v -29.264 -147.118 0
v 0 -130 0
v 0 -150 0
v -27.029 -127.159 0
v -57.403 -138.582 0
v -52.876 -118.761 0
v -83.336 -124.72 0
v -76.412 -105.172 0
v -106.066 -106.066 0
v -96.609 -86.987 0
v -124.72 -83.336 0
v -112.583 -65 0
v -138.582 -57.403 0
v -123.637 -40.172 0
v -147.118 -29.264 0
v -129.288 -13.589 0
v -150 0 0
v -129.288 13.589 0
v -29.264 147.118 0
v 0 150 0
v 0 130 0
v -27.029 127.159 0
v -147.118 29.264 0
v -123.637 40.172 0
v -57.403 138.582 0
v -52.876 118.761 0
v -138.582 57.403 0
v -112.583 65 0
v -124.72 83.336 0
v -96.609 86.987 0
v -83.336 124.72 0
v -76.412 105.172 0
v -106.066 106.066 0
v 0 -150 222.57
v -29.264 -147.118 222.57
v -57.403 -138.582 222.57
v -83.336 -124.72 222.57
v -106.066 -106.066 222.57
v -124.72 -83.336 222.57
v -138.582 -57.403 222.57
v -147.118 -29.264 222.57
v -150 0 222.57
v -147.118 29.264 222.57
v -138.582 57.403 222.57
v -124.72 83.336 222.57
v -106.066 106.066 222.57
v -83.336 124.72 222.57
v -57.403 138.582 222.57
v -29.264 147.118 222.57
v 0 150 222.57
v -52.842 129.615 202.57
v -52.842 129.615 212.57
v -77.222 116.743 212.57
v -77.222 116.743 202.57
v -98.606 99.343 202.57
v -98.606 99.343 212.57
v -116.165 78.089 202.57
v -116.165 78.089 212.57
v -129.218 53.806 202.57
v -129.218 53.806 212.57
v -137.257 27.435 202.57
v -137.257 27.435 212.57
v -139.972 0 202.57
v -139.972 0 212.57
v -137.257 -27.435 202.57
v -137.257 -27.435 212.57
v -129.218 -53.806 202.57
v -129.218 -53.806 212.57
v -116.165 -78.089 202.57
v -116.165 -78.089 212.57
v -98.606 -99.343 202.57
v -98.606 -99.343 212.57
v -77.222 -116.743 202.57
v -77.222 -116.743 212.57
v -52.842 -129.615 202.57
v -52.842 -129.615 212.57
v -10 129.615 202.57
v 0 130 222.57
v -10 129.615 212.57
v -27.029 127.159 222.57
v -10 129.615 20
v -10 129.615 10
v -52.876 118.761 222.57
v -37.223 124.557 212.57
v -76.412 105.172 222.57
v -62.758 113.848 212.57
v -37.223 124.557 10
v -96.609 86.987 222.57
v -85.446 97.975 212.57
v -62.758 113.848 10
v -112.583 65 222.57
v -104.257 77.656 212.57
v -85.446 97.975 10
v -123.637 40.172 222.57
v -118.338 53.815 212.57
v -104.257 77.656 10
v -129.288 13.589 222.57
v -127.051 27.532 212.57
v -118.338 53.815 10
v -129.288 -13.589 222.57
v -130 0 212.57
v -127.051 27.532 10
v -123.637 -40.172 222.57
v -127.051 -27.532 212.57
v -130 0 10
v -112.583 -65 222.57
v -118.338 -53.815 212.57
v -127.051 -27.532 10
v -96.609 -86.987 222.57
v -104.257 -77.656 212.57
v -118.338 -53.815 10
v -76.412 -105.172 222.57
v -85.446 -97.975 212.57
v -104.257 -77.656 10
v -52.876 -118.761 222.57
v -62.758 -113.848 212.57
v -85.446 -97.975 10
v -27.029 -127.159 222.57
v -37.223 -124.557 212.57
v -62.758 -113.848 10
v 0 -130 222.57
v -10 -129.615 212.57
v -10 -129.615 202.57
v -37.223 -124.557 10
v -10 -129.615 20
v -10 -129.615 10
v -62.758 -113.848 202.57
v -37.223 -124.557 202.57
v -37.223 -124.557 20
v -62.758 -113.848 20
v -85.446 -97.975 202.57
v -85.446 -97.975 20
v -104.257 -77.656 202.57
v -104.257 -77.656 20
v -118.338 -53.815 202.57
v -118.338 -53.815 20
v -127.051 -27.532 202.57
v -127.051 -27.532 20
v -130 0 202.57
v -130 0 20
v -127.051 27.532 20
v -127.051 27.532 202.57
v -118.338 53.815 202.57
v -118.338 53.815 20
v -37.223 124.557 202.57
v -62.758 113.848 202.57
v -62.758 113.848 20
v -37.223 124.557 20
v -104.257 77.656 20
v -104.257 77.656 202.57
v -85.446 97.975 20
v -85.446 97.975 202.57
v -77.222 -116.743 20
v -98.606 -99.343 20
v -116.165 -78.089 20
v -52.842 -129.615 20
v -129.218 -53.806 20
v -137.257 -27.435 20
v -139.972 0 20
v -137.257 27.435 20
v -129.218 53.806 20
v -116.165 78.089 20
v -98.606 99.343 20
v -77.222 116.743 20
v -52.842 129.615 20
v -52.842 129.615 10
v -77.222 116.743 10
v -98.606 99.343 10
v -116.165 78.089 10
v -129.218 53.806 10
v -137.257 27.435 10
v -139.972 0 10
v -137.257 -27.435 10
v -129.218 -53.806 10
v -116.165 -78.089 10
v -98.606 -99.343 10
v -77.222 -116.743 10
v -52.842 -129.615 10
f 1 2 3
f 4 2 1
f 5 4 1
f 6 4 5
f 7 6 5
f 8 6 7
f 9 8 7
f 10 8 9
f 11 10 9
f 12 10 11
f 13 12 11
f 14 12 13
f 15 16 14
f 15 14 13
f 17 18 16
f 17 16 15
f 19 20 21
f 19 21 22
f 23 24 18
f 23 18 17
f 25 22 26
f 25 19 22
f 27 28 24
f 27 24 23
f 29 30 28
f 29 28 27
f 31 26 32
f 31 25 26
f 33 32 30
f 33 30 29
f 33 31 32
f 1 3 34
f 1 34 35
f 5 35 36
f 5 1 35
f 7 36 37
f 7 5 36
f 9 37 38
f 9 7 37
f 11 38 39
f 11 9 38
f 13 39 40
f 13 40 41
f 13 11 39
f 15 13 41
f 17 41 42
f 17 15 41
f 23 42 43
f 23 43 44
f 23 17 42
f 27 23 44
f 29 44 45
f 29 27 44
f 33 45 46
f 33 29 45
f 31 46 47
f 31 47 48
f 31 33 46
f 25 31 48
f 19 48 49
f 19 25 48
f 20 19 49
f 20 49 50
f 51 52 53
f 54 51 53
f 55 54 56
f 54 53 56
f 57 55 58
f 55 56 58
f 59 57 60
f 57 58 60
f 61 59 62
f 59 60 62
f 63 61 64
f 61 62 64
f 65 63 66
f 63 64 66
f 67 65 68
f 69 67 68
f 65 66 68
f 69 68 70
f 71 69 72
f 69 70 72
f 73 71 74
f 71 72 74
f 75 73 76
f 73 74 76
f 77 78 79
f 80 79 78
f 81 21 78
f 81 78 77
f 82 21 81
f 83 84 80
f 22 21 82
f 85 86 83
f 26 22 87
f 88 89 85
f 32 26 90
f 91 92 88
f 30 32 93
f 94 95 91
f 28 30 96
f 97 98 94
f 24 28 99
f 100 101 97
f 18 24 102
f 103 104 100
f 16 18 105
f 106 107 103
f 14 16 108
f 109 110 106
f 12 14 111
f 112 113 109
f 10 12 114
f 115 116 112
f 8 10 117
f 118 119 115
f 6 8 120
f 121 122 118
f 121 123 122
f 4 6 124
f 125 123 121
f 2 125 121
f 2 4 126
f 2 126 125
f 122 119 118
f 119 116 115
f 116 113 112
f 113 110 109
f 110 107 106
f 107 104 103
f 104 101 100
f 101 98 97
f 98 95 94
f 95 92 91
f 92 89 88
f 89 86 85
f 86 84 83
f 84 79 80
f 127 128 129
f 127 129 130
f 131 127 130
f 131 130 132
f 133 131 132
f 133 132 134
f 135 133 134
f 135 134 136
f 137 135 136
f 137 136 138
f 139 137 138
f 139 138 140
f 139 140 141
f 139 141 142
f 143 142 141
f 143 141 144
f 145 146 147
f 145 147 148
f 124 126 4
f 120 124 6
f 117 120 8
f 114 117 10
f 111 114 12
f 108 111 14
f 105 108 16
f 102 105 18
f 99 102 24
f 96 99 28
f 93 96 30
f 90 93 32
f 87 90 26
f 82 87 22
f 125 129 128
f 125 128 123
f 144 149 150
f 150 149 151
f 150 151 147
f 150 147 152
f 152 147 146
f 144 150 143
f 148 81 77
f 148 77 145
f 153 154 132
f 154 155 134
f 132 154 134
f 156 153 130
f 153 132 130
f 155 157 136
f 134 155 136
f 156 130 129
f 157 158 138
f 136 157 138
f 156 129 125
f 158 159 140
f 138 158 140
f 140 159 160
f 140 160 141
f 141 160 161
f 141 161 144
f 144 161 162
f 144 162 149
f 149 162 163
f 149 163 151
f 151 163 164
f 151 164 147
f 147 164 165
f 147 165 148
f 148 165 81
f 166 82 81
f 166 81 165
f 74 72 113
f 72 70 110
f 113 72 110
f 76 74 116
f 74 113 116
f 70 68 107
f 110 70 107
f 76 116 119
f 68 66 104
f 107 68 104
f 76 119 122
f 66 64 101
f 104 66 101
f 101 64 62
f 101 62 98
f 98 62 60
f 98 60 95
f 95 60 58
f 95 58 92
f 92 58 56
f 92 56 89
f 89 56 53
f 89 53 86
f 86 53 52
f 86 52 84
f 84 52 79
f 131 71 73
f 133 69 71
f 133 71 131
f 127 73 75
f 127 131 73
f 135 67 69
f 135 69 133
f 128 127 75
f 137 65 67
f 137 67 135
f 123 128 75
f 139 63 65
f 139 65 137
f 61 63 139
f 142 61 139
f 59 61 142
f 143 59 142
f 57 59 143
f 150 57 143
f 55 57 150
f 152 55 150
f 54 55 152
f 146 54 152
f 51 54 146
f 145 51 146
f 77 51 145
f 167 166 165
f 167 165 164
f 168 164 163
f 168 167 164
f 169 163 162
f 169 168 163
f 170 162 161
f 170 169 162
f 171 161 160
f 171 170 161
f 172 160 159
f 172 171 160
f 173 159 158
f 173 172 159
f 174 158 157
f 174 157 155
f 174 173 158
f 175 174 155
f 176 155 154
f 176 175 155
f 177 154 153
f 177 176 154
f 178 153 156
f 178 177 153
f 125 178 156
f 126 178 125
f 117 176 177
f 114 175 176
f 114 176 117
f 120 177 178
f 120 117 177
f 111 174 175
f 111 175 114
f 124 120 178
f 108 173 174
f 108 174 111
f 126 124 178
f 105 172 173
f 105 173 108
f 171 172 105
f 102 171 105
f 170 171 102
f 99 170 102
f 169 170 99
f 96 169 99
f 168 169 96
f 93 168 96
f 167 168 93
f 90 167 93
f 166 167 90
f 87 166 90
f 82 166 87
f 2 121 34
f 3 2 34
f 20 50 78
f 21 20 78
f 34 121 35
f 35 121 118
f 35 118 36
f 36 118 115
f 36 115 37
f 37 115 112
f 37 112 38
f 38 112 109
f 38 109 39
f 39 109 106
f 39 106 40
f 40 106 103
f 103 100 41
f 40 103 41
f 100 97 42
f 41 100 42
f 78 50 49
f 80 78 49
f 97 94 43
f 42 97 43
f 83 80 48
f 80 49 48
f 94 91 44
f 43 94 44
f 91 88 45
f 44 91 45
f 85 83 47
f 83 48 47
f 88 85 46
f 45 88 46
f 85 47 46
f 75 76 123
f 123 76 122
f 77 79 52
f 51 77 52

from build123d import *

# Parameters (mm, degrees)
BOSS_EXTRUDE1_DEPTH = 222.57
CUT_EXTRUDE2_START  = -10
CUT_EXTRUDE2_DEPTH  = 10
CUT_EXTRUDE3_START  = -10
CUT_EXTRUDE3_DEPTH  = 10


with BuildPart() as part:
    # Sketch1 → Boss-Extrude1 (new body)
    with BuildSketch(Plane.XY):
        with BuildLine():
            Line((0, 150), (0, 130))
            ThreePointArc((0, 130), (-130, 0), (0, -130))
            Line((0, -130), (0, -150))
            ThreePointArc((0, -150), (-150, 0), (0, 150))
        make_face()
    extrude(amount=BOSS_EXTRUDE1_DEPTH)

    # Sketch2 → Cut-Extrude2 (cut)
    with BuildSketch(Plane.XY.offset(222.57).offset(CUT_EXTRUDE2_START)):
        with BuildLine():
            Line((-10, 129.614813968), (-52.842182765, 129.614813968))
            ThreePointArc((-52.842182765, 129.614813968), (-139.972484008, 0), (-52.842182765, -129.614813968))
            Line((-52.842182765, -129.614813968), (-10, -129.614813968))
            ThreePointArc((-10, -129.614813968), (-130, 0), (-10, 129.614813968))
        make_face()
    extrude(amount=-CUT_EXTRUDE2_DEPTH, mode=Mode.SUBTRACT)

    # Sketch3 → Cut-Extrude3 (cut)
    with BuildSketch(Plane(origin=(0, 0, 0), x_dir=(-1, 0, 0), z_dir=(0, 0, -1)).offset(CUT_EXTRUDE3_START)):
        with BuildLine():
            Line((10, 129.614813968), (52.842182765, 129.614813968))
            ThreePointArc((52.842182765, 129.614813968), (139.972484008, 0), (52.842182765, -129.614813968))
            Line((52.842182765, -129.614813968), (10, -129.614813968))
            ThreePointArc((10, -129.614813968), (130, 0), (10, 129.614813968))
        make_face()
    extrude(amount=-CUT_EXTRUDE3_DEPTH, mode=Mode.SUBTRACT)


solid = part.part
